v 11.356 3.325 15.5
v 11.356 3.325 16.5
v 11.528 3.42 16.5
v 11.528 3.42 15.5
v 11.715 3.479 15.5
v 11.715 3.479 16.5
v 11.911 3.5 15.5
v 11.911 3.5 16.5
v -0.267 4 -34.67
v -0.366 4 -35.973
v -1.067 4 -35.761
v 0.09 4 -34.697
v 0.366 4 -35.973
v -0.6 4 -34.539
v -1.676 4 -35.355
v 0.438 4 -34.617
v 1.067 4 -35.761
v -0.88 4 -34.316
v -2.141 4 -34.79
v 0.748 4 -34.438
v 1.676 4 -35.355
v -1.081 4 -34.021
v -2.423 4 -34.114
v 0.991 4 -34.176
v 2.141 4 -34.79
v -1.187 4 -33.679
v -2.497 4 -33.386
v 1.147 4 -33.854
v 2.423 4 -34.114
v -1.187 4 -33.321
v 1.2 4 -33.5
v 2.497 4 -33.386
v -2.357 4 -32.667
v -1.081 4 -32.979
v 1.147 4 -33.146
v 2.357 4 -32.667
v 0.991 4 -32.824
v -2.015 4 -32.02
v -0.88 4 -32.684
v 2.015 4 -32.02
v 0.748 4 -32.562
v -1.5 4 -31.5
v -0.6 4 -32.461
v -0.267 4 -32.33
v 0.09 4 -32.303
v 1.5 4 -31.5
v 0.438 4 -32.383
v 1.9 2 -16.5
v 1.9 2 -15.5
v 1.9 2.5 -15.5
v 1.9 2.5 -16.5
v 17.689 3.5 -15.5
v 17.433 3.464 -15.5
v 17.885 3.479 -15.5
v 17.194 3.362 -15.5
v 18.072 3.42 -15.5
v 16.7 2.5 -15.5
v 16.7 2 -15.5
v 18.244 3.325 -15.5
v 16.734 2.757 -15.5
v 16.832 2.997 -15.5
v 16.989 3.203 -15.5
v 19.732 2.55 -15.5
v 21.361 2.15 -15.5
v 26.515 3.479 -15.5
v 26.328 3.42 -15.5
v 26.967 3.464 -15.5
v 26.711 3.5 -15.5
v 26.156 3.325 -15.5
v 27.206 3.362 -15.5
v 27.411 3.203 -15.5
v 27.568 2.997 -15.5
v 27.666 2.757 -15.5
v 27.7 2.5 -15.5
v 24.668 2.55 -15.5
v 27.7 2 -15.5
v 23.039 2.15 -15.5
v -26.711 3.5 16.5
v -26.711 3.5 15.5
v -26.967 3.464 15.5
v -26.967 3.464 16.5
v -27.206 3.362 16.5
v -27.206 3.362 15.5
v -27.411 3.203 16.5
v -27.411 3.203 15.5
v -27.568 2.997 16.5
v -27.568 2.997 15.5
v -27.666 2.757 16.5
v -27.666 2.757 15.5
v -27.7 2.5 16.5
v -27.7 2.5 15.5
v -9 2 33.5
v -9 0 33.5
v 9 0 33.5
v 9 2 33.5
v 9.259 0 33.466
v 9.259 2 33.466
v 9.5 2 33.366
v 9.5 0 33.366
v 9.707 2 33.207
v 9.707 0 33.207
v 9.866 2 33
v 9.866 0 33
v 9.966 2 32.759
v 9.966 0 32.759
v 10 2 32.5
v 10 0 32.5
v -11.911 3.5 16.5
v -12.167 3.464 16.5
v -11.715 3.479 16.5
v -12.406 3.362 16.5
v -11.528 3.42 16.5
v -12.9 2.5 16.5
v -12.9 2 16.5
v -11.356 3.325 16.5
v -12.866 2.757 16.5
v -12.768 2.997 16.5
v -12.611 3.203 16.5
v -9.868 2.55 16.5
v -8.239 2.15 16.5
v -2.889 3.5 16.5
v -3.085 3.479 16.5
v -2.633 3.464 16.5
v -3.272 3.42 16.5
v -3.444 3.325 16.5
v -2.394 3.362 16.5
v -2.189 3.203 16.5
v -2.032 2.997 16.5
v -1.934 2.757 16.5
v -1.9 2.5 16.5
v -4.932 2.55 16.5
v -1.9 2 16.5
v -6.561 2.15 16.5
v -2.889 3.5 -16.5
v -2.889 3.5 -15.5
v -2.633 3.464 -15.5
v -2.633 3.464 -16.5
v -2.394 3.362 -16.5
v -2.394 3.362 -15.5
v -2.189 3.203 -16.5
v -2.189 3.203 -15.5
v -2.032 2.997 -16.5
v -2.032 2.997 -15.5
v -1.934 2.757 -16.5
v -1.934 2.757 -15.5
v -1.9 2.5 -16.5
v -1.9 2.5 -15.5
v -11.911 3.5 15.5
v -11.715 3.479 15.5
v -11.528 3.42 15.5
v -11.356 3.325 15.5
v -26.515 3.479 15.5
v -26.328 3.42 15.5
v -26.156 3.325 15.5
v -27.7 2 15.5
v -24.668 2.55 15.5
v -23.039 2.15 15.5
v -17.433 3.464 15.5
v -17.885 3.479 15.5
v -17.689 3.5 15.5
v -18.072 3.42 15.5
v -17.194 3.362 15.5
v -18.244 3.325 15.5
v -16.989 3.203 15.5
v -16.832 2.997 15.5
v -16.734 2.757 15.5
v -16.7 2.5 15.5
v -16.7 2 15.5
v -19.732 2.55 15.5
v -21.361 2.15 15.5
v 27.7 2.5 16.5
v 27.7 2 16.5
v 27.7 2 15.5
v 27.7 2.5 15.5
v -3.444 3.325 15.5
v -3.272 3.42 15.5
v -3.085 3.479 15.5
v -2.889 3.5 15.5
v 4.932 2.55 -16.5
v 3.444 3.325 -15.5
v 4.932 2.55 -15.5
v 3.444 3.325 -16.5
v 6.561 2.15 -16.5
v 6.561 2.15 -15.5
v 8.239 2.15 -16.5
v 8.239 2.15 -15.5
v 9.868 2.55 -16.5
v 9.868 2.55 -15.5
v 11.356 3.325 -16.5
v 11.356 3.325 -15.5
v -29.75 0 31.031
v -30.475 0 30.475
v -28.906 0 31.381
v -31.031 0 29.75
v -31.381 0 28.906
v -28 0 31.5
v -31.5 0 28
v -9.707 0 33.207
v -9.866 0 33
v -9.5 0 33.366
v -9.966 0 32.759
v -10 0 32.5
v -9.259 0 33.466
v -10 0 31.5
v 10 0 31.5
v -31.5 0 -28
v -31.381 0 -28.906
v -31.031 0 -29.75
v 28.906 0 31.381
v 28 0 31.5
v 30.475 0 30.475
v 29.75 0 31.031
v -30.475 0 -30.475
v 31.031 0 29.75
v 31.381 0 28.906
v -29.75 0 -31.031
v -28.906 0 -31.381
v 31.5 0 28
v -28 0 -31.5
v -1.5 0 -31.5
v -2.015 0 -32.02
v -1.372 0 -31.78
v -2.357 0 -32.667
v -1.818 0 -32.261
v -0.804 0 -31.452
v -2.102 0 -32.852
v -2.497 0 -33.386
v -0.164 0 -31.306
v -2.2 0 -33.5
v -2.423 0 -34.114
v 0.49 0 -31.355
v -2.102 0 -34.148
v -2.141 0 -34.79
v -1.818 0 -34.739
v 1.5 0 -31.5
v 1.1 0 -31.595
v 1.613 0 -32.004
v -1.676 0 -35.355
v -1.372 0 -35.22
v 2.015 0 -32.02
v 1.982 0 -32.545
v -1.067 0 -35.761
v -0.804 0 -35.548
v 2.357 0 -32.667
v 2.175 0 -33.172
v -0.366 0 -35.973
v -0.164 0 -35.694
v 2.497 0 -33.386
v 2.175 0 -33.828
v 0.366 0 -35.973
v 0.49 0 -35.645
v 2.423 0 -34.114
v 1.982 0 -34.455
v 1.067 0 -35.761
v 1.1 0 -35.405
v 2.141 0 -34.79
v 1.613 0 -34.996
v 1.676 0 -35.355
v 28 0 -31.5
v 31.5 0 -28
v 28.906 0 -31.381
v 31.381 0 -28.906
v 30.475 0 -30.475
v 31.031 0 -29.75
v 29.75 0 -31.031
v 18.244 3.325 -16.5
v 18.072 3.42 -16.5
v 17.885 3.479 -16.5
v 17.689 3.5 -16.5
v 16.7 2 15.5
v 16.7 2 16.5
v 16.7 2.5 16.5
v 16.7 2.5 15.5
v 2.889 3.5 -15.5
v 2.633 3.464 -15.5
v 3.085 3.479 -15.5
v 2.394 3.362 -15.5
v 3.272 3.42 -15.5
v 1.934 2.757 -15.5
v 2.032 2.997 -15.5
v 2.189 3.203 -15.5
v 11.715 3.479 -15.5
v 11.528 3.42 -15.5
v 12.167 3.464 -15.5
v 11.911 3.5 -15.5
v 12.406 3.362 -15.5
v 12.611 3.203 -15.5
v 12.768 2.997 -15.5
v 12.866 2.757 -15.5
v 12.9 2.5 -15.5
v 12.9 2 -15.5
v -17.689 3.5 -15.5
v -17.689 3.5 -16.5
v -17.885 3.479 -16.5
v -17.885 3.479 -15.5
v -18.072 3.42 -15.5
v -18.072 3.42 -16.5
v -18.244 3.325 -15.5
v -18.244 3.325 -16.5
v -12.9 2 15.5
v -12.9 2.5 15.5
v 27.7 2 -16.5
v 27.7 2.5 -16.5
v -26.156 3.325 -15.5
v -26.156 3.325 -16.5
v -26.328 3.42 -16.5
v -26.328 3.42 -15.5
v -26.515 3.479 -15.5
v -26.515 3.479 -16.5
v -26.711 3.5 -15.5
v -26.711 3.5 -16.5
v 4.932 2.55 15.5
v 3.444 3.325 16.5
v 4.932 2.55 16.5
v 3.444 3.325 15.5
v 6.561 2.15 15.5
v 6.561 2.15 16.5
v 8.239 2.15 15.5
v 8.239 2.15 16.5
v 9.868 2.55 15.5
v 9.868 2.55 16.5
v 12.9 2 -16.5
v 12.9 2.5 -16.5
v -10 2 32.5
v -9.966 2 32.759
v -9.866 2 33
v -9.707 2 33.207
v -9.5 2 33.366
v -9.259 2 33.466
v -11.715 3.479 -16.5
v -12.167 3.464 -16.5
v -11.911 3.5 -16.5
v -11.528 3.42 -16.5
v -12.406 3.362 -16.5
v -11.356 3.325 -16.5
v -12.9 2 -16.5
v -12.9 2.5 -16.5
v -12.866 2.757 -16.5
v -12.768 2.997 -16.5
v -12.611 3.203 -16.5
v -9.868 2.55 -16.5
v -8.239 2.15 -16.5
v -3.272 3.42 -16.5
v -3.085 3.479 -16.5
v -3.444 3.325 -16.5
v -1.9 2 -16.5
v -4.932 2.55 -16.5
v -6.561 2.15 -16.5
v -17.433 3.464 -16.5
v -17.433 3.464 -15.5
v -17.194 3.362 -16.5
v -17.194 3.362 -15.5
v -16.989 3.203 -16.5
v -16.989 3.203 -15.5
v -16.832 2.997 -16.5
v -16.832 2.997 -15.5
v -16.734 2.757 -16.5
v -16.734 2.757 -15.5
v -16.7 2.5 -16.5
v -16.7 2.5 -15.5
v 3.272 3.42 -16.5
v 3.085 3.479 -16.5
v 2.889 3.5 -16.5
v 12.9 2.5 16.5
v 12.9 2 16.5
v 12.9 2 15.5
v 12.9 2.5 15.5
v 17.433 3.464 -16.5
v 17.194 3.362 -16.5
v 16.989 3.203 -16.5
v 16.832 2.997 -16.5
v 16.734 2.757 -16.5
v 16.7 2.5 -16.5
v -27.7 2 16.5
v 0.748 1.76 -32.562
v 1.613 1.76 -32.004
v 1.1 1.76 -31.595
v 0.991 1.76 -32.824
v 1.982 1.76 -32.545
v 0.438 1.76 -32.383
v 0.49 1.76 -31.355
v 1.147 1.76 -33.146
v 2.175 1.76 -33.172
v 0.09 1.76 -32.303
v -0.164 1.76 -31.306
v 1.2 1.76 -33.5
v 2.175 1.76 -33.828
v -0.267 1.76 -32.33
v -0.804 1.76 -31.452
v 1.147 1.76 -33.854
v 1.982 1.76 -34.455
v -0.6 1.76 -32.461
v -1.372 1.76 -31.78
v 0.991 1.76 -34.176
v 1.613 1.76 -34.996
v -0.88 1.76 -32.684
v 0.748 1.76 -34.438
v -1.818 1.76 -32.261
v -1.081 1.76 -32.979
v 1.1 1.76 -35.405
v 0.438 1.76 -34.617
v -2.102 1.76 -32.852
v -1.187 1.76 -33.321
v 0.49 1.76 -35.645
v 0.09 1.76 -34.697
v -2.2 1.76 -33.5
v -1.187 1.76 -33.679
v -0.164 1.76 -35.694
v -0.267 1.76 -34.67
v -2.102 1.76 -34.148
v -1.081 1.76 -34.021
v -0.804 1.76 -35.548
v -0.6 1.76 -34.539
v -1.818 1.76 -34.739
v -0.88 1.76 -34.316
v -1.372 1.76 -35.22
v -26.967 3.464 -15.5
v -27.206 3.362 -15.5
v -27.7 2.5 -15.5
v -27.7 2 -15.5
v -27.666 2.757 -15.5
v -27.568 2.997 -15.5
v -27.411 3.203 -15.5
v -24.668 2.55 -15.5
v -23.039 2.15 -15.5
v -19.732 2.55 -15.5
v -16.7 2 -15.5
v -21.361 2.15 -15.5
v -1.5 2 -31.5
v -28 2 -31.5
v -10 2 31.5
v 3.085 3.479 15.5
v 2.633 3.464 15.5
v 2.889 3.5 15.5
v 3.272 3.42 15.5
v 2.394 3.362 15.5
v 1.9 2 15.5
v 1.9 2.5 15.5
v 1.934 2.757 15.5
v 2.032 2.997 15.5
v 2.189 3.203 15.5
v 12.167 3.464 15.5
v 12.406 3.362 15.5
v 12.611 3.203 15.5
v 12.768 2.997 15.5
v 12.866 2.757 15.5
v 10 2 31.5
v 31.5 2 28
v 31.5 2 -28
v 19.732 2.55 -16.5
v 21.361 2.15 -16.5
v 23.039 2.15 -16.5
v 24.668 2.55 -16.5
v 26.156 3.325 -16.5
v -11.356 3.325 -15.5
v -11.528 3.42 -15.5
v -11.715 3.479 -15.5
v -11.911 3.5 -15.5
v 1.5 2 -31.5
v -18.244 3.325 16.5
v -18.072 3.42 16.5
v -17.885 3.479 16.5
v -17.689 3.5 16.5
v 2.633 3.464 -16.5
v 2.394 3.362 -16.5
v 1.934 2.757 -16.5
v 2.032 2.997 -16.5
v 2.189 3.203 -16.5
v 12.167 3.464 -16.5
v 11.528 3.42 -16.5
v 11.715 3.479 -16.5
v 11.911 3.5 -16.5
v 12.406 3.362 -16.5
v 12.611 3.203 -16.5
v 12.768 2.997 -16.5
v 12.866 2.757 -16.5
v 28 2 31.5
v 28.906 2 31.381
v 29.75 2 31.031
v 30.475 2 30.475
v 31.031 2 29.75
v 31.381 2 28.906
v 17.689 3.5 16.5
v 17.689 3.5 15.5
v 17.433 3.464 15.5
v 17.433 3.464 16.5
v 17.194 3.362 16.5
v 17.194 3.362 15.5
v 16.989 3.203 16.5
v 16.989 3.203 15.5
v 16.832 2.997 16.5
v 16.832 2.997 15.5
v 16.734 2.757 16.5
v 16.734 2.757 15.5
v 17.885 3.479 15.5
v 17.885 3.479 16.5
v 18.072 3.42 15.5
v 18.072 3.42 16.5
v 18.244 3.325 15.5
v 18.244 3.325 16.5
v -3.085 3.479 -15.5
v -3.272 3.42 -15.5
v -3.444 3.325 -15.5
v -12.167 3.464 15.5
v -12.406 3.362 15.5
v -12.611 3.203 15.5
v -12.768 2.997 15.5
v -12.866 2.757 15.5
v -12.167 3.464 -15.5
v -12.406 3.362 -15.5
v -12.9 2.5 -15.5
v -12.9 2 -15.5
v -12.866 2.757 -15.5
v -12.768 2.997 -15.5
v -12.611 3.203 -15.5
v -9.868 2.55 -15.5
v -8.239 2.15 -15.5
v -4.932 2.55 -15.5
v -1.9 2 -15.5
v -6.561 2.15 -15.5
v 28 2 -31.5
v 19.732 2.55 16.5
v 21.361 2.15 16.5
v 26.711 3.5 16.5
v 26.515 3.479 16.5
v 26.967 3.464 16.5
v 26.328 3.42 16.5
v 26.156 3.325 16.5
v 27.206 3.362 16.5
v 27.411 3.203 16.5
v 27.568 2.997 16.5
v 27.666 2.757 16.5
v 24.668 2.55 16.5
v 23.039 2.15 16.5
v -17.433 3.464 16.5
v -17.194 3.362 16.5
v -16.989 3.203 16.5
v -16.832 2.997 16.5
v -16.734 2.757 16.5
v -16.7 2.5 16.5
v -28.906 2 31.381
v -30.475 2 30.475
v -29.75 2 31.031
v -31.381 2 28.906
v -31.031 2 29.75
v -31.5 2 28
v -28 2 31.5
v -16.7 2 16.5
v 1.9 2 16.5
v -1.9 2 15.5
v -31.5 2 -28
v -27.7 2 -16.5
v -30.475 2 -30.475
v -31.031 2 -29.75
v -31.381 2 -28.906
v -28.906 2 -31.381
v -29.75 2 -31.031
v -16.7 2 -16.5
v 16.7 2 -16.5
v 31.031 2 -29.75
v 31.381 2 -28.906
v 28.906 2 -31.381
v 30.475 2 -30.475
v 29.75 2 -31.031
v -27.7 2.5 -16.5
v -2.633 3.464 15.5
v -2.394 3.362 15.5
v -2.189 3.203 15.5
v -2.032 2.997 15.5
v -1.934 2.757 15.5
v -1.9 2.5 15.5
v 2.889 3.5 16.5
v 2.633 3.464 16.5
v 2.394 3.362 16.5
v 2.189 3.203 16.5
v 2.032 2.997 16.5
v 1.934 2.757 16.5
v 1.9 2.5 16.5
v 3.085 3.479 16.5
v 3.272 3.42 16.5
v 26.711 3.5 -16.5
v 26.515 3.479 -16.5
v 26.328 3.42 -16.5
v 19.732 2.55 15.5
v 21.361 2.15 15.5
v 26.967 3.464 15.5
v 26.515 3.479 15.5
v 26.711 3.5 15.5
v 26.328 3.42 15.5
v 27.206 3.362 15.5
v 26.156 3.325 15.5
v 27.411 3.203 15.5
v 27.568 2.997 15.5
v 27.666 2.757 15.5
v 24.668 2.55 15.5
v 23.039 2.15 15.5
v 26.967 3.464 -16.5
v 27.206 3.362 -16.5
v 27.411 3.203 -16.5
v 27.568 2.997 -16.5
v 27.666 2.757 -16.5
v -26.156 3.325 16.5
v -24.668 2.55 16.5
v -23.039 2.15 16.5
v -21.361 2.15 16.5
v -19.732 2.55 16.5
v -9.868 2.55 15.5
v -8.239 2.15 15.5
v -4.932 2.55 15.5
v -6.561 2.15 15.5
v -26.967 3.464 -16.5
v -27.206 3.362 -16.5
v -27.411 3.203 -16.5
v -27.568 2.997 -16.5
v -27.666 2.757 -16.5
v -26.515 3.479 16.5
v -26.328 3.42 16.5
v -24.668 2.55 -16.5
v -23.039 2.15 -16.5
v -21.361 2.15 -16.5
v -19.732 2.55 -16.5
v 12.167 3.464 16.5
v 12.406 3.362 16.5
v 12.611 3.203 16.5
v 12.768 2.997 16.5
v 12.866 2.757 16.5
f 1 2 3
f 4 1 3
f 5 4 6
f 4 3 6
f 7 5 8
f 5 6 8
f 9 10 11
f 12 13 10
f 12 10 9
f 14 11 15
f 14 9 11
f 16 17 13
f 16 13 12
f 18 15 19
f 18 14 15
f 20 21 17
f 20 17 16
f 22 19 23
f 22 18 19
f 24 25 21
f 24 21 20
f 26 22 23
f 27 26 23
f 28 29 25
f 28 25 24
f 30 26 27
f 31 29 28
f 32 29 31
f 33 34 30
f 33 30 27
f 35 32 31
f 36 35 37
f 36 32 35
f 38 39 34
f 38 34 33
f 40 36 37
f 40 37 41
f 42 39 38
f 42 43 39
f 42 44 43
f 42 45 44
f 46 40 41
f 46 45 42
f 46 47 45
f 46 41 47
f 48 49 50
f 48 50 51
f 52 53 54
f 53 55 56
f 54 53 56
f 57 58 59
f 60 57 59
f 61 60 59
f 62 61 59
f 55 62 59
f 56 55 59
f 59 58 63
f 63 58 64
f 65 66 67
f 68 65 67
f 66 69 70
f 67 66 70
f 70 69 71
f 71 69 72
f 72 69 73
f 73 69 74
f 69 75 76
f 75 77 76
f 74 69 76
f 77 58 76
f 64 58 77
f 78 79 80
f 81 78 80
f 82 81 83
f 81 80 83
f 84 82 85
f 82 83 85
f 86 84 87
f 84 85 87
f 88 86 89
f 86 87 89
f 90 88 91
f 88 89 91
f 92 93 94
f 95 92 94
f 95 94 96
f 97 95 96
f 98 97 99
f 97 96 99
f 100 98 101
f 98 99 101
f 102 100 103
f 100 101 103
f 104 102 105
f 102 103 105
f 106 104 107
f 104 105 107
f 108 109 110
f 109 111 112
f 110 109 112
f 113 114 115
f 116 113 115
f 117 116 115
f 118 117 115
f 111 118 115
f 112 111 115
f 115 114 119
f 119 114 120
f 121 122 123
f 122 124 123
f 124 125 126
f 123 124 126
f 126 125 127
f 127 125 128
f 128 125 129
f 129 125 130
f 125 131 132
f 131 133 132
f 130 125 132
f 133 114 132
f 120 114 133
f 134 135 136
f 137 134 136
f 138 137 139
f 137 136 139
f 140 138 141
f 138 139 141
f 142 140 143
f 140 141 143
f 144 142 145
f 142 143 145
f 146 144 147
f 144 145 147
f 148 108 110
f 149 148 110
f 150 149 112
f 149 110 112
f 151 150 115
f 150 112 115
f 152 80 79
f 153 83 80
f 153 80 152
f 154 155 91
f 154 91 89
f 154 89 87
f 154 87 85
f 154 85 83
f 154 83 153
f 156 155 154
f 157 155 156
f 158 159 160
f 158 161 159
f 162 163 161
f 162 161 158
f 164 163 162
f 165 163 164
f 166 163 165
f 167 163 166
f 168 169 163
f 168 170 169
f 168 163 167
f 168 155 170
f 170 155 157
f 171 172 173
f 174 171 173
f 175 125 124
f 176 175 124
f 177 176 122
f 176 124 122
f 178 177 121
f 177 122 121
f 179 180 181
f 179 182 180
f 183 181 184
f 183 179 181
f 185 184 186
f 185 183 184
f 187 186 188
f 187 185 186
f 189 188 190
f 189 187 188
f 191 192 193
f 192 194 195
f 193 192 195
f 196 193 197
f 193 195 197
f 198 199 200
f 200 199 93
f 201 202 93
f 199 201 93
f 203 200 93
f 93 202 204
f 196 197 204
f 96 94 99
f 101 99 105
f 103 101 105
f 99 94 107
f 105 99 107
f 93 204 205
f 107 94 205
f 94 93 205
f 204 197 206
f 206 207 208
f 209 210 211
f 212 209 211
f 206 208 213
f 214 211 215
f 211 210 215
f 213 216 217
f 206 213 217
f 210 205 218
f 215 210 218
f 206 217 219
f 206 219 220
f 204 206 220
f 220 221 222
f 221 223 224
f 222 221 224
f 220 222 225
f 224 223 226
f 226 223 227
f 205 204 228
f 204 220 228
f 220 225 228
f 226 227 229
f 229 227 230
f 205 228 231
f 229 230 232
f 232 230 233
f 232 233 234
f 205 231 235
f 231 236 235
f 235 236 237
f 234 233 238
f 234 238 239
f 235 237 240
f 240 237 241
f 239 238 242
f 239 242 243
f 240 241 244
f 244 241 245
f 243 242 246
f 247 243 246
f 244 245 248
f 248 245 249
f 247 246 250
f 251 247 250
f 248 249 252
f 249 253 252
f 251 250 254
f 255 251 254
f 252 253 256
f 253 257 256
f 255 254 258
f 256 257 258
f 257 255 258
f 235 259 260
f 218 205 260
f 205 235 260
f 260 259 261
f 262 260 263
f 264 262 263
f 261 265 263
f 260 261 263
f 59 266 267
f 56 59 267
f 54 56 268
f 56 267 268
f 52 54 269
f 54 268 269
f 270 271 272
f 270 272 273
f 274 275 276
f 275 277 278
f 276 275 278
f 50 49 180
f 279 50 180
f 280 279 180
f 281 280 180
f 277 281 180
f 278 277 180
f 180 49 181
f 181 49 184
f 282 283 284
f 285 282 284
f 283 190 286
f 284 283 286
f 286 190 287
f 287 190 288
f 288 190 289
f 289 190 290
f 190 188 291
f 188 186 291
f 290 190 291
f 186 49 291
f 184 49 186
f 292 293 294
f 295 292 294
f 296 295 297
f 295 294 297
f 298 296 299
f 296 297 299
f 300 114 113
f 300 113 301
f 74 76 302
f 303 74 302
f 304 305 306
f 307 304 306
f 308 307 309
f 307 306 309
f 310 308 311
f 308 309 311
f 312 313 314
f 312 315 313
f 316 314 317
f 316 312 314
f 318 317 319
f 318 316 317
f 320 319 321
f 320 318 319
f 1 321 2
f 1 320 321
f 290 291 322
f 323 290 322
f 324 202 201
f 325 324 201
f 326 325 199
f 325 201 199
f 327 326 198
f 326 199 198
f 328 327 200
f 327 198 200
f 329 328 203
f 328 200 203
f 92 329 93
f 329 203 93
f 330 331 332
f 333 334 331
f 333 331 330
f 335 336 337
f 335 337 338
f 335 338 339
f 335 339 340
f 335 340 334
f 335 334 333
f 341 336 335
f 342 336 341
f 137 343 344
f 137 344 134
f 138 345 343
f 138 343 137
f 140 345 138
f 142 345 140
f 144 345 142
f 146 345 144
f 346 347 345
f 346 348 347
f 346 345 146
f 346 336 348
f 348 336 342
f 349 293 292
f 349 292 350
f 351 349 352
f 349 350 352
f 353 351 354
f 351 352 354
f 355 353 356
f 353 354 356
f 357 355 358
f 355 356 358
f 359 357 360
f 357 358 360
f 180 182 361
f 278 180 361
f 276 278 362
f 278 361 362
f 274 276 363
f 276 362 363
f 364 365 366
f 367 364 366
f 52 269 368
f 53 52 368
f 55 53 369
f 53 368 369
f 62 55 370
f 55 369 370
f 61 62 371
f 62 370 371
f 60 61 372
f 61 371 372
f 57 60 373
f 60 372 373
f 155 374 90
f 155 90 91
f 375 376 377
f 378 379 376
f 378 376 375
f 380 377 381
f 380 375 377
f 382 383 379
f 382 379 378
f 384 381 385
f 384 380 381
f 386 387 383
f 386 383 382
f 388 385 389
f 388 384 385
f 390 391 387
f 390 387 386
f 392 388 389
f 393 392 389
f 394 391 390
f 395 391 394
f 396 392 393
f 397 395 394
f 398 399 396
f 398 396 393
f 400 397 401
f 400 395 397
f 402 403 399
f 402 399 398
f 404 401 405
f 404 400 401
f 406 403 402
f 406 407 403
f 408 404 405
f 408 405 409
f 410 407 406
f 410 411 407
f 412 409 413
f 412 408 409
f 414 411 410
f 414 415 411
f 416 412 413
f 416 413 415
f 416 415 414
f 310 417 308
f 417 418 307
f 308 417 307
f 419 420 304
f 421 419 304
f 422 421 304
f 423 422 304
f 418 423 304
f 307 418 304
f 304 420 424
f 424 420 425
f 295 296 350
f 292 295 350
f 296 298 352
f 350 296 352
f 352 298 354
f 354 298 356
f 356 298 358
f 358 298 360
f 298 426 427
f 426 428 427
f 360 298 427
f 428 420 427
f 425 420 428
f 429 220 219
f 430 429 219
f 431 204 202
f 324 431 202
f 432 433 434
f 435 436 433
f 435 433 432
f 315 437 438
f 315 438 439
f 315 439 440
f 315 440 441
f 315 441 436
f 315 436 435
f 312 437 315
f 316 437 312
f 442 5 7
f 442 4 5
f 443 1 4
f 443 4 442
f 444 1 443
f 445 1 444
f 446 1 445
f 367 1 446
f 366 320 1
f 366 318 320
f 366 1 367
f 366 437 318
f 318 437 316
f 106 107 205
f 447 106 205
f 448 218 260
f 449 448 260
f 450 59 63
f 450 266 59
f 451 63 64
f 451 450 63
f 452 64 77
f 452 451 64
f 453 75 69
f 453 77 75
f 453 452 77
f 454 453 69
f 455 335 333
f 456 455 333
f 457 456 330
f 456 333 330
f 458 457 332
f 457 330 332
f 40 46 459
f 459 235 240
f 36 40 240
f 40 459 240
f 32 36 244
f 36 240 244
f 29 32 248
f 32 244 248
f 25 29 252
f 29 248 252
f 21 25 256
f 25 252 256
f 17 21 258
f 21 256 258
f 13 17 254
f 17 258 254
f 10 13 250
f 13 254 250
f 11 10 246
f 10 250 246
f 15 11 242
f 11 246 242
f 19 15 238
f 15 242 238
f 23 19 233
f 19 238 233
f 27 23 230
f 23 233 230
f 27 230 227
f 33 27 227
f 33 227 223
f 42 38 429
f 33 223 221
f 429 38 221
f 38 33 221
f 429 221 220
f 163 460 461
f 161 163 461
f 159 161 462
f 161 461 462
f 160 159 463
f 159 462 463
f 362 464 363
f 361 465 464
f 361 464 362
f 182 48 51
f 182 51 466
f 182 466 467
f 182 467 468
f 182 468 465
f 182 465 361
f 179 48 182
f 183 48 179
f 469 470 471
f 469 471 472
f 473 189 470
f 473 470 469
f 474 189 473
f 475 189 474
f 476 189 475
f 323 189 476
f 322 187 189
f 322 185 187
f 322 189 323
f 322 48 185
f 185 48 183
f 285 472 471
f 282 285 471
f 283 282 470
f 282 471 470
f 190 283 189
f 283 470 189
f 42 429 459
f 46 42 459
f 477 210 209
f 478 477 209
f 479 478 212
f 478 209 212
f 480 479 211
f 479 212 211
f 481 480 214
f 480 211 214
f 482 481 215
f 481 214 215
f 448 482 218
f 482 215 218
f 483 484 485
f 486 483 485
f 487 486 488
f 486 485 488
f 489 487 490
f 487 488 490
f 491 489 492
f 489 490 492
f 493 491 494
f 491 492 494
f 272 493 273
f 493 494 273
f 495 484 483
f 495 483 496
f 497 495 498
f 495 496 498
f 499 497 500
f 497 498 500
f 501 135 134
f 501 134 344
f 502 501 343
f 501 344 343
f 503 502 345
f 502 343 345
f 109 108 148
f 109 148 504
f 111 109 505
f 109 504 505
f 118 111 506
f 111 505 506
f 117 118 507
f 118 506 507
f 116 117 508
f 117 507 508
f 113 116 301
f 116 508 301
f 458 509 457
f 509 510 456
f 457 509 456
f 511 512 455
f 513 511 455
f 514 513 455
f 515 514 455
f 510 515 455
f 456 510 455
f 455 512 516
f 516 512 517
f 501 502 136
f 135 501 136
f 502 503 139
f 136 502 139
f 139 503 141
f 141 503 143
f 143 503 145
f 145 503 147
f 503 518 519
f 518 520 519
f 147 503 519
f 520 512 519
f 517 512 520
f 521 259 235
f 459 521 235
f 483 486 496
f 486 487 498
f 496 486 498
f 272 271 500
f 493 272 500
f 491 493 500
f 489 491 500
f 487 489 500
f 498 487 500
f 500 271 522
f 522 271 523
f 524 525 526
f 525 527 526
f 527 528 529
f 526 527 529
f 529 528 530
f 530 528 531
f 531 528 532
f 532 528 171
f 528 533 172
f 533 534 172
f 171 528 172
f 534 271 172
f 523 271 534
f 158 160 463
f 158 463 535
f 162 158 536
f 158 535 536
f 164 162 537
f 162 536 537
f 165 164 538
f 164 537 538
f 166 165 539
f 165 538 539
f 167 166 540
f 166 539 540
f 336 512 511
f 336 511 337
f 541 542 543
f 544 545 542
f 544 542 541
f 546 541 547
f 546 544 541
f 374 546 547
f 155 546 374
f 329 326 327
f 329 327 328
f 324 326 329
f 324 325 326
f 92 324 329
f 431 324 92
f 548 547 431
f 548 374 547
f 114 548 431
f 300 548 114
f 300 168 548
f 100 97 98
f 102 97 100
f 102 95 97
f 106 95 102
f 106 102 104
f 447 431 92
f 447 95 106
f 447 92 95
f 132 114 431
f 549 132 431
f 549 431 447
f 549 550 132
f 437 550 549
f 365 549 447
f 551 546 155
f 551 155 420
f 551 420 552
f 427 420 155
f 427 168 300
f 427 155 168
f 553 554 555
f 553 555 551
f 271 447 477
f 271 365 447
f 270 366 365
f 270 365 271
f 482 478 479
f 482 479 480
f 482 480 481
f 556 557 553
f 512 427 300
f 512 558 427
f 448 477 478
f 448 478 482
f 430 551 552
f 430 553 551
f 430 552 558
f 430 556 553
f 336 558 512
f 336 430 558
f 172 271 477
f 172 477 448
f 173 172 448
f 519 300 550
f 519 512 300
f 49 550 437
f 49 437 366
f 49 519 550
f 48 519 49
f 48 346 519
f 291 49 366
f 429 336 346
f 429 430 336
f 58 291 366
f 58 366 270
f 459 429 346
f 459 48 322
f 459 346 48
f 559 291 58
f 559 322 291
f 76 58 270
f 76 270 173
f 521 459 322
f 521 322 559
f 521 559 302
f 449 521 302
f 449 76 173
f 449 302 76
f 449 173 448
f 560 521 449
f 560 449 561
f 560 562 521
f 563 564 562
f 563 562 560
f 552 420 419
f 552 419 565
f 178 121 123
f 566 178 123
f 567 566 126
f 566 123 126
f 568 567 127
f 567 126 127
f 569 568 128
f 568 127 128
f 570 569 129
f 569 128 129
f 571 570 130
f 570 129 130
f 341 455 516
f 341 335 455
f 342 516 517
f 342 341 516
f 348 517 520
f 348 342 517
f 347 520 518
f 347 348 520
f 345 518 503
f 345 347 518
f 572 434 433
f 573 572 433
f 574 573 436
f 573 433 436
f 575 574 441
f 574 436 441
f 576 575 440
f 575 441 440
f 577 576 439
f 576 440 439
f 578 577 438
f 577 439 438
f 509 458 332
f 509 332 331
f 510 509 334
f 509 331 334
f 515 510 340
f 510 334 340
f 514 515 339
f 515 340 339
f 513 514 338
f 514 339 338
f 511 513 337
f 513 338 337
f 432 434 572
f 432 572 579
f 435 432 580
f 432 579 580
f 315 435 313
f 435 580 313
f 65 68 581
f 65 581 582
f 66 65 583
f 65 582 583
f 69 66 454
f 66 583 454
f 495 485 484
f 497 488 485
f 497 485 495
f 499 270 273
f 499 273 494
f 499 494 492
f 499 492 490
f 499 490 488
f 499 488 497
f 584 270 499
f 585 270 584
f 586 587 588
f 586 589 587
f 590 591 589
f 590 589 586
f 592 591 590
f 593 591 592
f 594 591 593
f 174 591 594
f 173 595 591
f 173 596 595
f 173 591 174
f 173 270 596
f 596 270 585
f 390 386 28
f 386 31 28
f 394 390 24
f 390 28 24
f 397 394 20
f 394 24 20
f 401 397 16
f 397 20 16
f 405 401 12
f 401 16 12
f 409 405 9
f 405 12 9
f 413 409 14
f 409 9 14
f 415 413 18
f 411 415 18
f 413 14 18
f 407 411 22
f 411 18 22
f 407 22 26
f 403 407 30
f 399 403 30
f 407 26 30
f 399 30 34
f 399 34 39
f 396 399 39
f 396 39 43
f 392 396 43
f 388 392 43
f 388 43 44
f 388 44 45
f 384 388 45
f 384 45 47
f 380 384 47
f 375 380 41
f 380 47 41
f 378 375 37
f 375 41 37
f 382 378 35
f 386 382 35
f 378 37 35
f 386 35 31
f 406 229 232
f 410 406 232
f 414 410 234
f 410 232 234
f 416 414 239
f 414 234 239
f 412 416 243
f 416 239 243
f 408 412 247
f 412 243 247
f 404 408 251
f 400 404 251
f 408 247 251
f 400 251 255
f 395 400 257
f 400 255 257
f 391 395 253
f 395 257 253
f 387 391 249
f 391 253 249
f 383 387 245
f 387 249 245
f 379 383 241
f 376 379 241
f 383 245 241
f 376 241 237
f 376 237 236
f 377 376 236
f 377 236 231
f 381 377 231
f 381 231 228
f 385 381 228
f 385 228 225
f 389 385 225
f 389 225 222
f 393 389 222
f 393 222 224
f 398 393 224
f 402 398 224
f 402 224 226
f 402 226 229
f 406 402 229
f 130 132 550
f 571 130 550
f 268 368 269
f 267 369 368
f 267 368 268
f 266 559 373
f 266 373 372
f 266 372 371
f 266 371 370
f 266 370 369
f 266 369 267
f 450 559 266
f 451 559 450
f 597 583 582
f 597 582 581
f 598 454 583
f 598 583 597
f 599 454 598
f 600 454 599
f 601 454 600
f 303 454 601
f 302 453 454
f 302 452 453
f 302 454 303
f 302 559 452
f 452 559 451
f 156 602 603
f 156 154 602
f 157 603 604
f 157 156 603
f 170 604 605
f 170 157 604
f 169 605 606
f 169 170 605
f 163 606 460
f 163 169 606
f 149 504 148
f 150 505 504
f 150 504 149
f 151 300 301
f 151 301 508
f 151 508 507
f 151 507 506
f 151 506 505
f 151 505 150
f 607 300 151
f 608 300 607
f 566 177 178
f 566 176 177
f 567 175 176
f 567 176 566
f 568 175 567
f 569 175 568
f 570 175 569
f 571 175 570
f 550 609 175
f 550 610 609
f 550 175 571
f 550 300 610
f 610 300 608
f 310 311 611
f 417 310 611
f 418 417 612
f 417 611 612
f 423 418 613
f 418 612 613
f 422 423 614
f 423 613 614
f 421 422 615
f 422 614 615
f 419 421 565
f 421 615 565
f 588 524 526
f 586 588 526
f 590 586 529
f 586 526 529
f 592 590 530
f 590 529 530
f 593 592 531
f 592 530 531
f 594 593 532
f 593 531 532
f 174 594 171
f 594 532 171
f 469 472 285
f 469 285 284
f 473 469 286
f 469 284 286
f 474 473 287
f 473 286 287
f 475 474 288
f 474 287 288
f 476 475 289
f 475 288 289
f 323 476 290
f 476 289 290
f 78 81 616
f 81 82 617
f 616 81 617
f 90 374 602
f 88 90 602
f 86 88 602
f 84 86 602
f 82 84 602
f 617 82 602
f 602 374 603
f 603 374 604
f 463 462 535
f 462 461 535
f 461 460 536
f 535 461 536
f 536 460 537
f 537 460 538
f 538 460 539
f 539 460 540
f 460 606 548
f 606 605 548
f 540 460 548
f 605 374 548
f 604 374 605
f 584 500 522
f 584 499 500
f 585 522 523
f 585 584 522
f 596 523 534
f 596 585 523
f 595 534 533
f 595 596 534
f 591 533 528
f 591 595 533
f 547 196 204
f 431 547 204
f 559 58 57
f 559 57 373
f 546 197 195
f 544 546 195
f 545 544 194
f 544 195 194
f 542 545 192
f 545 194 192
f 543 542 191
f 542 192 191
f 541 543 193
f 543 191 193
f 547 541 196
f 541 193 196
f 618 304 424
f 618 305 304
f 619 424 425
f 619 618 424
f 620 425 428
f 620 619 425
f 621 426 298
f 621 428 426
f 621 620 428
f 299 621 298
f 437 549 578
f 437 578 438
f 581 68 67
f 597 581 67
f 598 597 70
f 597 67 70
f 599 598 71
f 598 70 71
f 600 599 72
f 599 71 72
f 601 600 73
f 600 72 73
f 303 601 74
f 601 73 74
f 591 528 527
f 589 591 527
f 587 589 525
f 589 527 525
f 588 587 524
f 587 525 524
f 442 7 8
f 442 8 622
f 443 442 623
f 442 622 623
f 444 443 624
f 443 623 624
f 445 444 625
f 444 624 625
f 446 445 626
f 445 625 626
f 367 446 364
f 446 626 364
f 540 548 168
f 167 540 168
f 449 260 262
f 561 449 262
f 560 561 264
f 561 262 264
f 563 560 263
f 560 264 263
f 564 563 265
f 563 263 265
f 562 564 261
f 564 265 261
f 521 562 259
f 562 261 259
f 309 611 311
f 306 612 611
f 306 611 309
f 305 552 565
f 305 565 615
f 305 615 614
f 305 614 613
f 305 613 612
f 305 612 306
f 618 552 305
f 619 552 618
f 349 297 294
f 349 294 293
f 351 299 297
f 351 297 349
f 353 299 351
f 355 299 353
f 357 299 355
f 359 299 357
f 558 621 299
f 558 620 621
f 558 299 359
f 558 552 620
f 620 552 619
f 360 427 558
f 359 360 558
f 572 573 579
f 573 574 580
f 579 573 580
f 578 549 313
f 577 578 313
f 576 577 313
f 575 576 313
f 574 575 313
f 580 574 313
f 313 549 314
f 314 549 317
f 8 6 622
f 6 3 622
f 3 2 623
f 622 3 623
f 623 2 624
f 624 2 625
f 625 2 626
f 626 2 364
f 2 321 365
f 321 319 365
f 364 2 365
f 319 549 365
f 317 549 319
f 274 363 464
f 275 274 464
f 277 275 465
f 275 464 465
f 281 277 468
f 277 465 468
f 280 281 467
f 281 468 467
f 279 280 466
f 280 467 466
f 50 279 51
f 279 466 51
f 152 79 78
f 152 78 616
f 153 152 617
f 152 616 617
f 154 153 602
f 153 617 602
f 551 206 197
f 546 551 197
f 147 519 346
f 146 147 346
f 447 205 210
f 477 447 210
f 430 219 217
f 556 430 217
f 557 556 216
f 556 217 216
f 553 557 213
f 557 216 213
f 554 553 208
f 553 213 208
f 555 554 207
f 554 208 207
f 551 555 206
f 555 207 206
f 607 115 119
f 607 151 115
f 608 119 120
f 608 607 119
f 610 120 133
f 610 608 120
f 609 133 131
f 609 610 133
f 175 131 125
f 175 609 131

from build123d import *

# Parameters (mm, degrees)
BOSS_EXTRUDE1_DEPTH                     = 2
SKETCH2_R                               = 2.5
BOSS_EXTRUDE3_DEPTH                     = 4
SKETCH5_W                               = 11
SKETCH5_H                               = 1
EXTRUDE_THIN2_DEPTH                     = 1.5
CUT_EXTRUDE2_DEPTH                      = 49.002604096
CUT_EXTRUDE2_DEPTH_BACK                 = 49.002604096
SKETCH7_R                               = 7
FILLET2_R                               = 1
CUT_EXTRUDE3_START                      = -2
CUT_EXTRUDE3_DEPTH                      = 2
CBORE_FOR_M2_HEX_HEAD_BOLT2_D           = 2.4
CBORE_FOR_M2_HEX_HEAD_BOLT2_CBORE_D     = 4.4
CBORE_FOR_M2_HEX_HEAD_BOLT2_CBORE_DEPTH = 1.76


with BuildPart() as part:
    # Sketch1 → Boss-Extrude1 (new body)
    with BuildSketch(Plane(origin=(0, 0, 0), x_dir=(1, 0, 0), z_dir=(0, 1, 0))):
        with BuildLine():
            Line((10, -31.5), (28, -31.5))
            ThreePointArc((28, -31.5), (30.474873734, -30.474873734), (31.5, -28))
            Line((31.5, -28), (31.5, 28))
            ThreePointArc((31.5, 28), (30.474873734, 30.474873734), (28, 31.5))
            Line((28, 31.5), (-28, 31.5))
            ThreePointArc((-28, 31.5), (-30.474873734, 30.474873734), (-31.5, 28))
            Line((-31.5, 28), (-31.5, -28))
            ThreePointArc((-31.5, -28), (-30.474873734, -30.474873734), (-28, -31.5))
            Line((-28, -31.5), (-10, -31.5))
            Line((-10, -31.5), (-10, -32.5))
            ThreePointArc((-10, -32.5), (-9.707106781, -33.207106781), (-9, -33.5))
            Line((-9, -33.5), (9, -33.5))
            ThreePointArc((9, -33.5), (9.707106781, -33.207106781), (10, -32.5))
            Line((10, -32.5), (10, -31.5))
        make_face()
    extrude(amount=BOSS_EXTRUDE1_DEPTH)

    # Sketch2 → Boss-Extrude3 (add)
    with BuildSketch(Plane(origin=(0, 0, 0), x_dir=(1, 0, 0), z_dir=(0, 1, 0))):
        with Locations(Location((0, 33.5, 0), (0, 0, 233.130102354))):
            Circle(SKETCH2_R)
    extrude(amount=BOSS_EXTRUDE3_DEPTH)

    # Sketch5 → Extrude-Thin2 (add)
    with BuildSketch(Plane(origin=(0, 2, 0), x_dir=(1, 0, 0), z_dir=(0, 1, 0))):
        with Locations((-22.2, 16)):
            Rectangle(SKETCH5_W, SKETCH5_H)
        with Locations((-22.2, -16)):
            Rectangle(SKETCH5_W, SKETCH5_H)
        with Locations((-7.4, -16)):
            Rectangle(SKETCH5_W, SKETCH5_H)
        with Locations((-7.4, 16)):
            Rectangle(SKETCH5_W, SKETCH5_H)
        with Locations((7.4, -16)):
            Rectangle(SKETCH5_W, SKETCH5_H)
        with Locations((7.4, 16)):
            Rectangle(SKETCH5_W, SKETCH5_H)
        with Locations((22.2, -16)):
            Rectangle(SKETCH5_W, SKETCH5_H)
        with Locations((22.2, 16)):
            Rectangle(SKETCH5_W, SKETCH5_H)
    extrude(amount=EXTRUDE_THIN2_DEPTH)

    # Sketch7 → Cut-Extrude2 (cut, two sides: drawn at the far end of the back side and taken through both)
    with BuildSketch(Plane.XY.offset(-CUT_EXTRUDE2_DEPTH_BACK)):
        with Locations((-22.2, 9.1)):
            Circle(SKETCH7_R)
        with Locations((-7.4, 9.1)):
            Circle(SKETCH7_R)
        with Locations((7.4, 9.1)):
            Circle(SKETCH7_R)
        with Locations((22.2, 9.1)):
            Circle(SKETCH7_R)
    extrude(amount=CUT_EXTRUDE2_DEPTH + CUT_EXTRUDE2_DEPTH_BACK, mode=Mode.SUBTRACT)

    # Fillet2
    # the kernel refuses this fillet: 1 mm, written as the material it takes off along each edge
    with BuildSketch(Plane(origin=(-16.7, 3.5, 19), x_dir=(0, -1, 0), z_dir=(0, 0, -1)), Plane(origin=(-27.7, 3.5, 13), x_dir=(0, -1, 0), z_dir=(0, 0, 1)), Plane(origin=(-12.9, 3.5, 13), x_dir=(0, -1, 0), z_dir=(0, 0, 1)), Plane(origin=(-1.9, 3.5, 19), x_dir=(0, -1, 0), z_dir=(0, 0, -1)), Plane(origin=(1.9, 3.5, 13), x_dir=(0, -1, 0), z_dir=(0, 0, 1)), Plane(origin=(12.9, 3.5, 19), x_dir=(0, -1, 0), z_dir=(0, 0, -1)), Plane(origin=(16.7, 3.5, 13), x_dir=(0, -1, 0), z_dir=(0, 0, 1)), Plane(origin=(27.7, 3.5, 19), x_dir=(0, -1, 0), z_dir=(0, 0, -1)), Plane(origin=(16.7, 3.5, -19), x_dir=(0, -1, 0), z_dir=(0, 0, 1)), Plane(origin=(27.7, 3.5, -13), x_dir=(0, -1, 0), z_dir=(0, 0, -1)), Plane(origin=(12.9, 3.5, -13), x_dir=(0, -1, 0), z_dir=(0, 0, -1)), Plane(origin=(1.9, 3.5, -19), x_dir=(0, -1, 0), z_dir=(0, 0, 1)), Plane(origin=(-1.9, 3.5, -13), x_dir=(0, -1, 0), z_dir=(0, 0, -1)), Plane(origin=(-12.9, 3.5, -19), x_dir=(0, -1, 0), z_dir=(0, 0, 1)), Plane(origin=(-16.7, 3.5, -13), x_dir=(0, -1, 0), z_dir=(0, 0, -1)), Plane(origin=(-27.7, 3.5, -19), x_dir=(0, -1, 0), z_dir=(0, 0, 1))) as fillet2_piece_1:
        with BuildLine():
            CenterArc((FILLET2_R, FILLET2_R), FILLET2_R, 180, 90)
            Line((0, FILLET2_R), (0, 0))
            Line((0, 0), (FILLET2_R, 0))
        make_face()
    extrude(amount=6, mode=Mode.SUBTRACT)
    with BuildSketch(Plane(origin=(-18, 3.5, 17.302654555), x_dir=(1, 0, 0), z_dir=(0, 0, -1)), Plane(origin=(-3.2, 3.5, 17.302654555), x_dir=(1, 0, 0), z_dir=(0, 0, -1)), Plane(origin=(11.6, 3.5, 17.302654555), x_dir=(1, 0, 0), z_dir=(0, 0, -1)), Plane(origin=(26.4, 3.5, 17.302654555), x_dir=(1, 0, 0), z_dir=(0, 0, -1))) as fillet2_piece_2:
        with BuildLine():
            CenterArc((0.321061822, 1), FILLET2_R, 235.58849133, 34.41150867)
            ThreePointArc((-0.244070906, 0.175), (-0.121096827, 0.088809093), (0, 0))
            Line((0, 0), (0.321061822, 0))
        make_face()
    extrude(amount=2.605309111, mode=Mode.SUBTRACT)
    with BuildSketch(Plane(origin=(-26.4, 3.5, 17.302654555), x_dir=(0.8126870133502501, -0.5827004533479019, 0), z_dir=(0, 0, -1)), Plane(origin=(-11.6, 3.5, 17.302654555), x_dir=(0.8126870133502461, -0.5827004533479074, 0), z_dir=(0, 0, -1)), Plane(origin=(3.2, 3.5, 17.302654555), x_dir=(0.8126870133502461, -0.5827004533479074, 0), z_dir=(0, 0, -1)), Plane(origin=(18, 3.5, 17.302654555), x_dir=(0.8126870133502501, -0.5827004533479019, 0), z_dir=(0, 0, -1))) as fillet2_piece_3:
        with BuildLine():
            CenterArc((0.32177768, 0.999769883), FILLET2_R, 234.359296842, 34.41150867)
            Line((-0.260922773, 0.187082869), (0, 0))
            ThreePointArc((0, 0), (0.150162917, 0.001610821), (0.300325835, 0))
        make_face()
    extrude(amount=2.605309111, mode=Mode.SUBTRACT)
    with BuildSketch(Plane(origin=(18, 3.5, -17.302654555), x_dir=(0.8126870133502501, -0.5827004533479019, 0), z_dir=(0, 0, 1)), Plane(origin=(3.2, 3.5, -17.302654555), x_dir=(0.8126870133502461, -0.5827004533479074, 0), z_dir=(0, 0, 1)), Plane(origin=(-11.6, 3.5, -17.302654555), x_dir=(0.8126870133502461, -0.5827004533479074, 0), z_dir=(0, 0, 1)), Plane(origin=(-26.4, 3.5, -17.302654555), x_dir=(0.8126870133502501, -0.5827004533479019, 0), z_dir=(0, 0, 1))) as fillet2_piece_4:
        with BuildLine():
            CenterArc((0.32177768, -0.999769883), FILLET2_R, 91.229194488, 34.41150867)
            Line((-0.260922773, -0.187082869), (0, 0))
            ThreePointArc((0, 0), (0.150162917, -0.001610821), (0.300325835, 0))
        make_face()
    extrude(amount=2.605309111, mode=Mode.SUBTRACT)
    with BuildSketch(Plane(origin=(26.4, 3.5, -17.302654555), x_dir=(1, 0, 0), z_dir=(0, 0, 1)), Plane(origin=(11.6, 3.5, -17.302654555), x_dir=(1, 0, 0), z_dir=(0, 0, 1)), Plane(origin=(-3.2, 3.5, -17.302654555), x_dir=(1, 0, 0), z_dir=(0, 0, 1)), Plane(origin=(-18, 3.5, -17.302654555), x_dir=(1, 0, 0), z_dir=(0, 0, 1))) as fillet2_piece_5:
        with BuildLine():
            CenterArc((0.321061822, -1), FILLET2_R, 90, 34.41150867)
            ThreePointArc((-0.244070906, -0.175), (-0.121096827, -0.088809093), (0, 0))
            Line((0, 0), (0.321061822, 0))
        make_face()
    extrude(amount=2.605309111, mode=Mode.SUBTRACT)

    # Sketch8 → Cut-Extrude3 (cut)
    with BuildSketch(Plane(origin=(0, 4, 0), x_dir=(1, 0, 0), z_dir=(0, 1, 0)).offset(CUT_EXTRUDE3_START)):
        with BuildLine():
            Line((-1.5, 31.5), (1.5, 31.5))
            ThreePointArc((1.5, 31.5), (0, 31), (-1.5, 31.5))
        make_face()
    extrude(amount=CUT_EXTRUDE3_DEPTH, mode=Mode.SUBTRACT)

    # CBORE for M2 Hex Head Bolt2 (through all)
    with Locations(Plane(origin=(0, 0, 0), x_dir=(-1, 0, 0), z_dir=(0, -1, 0))):
        with Locations((0, 33.5)):
            CounterBoreHole(CBORE_FOR_M2_HEX_HEAD_BOLT2_D / 2, CBORE_FOR_M2_HEX_HEAD_BOLT2_CBORE_D / 2, CBORE_FOR_M2_HEX_HEAD_BOLT2_CBORE_DEPTH)


solid = part.part
